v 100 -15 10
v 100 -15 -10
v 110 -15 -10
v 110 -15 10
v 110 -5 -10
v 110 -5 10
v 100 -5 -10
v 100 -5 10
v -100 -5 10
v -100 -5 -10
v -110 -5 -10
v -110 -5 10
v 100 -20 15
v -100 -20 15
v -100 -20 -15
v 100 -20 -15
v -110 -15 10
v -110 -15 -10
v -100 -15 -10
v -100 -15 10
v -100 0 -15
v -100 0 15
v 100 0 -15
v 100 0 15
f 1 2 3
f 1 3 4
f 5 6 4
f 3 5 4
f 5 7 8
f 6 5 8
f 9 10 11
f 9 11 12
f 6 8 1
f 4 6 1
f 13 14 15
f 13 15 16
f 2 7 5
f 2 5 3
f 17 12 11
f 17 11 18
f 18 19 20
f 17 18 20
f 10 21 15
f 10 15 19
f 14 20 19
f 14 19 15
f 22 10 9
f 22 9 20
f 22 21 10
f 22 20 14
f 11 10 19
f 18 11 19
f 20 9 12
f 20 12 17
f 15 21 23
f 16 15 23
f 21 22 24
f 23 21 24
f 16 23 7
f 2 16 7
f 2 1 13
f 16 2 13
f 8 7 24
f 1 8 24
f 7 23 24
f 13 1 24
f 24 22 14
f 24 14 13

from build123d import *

# Parameters (mm, degrees)
F0_W     = 200
F0_H     = 30
F1_DEPTH = 20
F2_W     = 10
F2_H     = 20
F3_DEPTH = 10


with BuildPart() as f1:
    # F0 (on Front) → F1 (new body)
    with BuildSketch(Plane.XZ):
        Rectangle(F0_W, F0_H)
    extrude(amount=F1_DEPTH)

    # F2 (on face) → F3 (join)
    with BuildSketch(Plane(origin=(-100, 0, 0), x_dir=(0, -1, 0), z_dir=(-1, 0, 0))):
        with Locations((10, 0)):
            Rectangle(F2_W, F2_H)
    extrude(amount=F3_DEPTH)

    # F4: F1 across plane


with BuildPart() as f1_1:
    add(f1.part)
    add(f1.part.mirror(Plane.YZ))


solid = f1_1.part
